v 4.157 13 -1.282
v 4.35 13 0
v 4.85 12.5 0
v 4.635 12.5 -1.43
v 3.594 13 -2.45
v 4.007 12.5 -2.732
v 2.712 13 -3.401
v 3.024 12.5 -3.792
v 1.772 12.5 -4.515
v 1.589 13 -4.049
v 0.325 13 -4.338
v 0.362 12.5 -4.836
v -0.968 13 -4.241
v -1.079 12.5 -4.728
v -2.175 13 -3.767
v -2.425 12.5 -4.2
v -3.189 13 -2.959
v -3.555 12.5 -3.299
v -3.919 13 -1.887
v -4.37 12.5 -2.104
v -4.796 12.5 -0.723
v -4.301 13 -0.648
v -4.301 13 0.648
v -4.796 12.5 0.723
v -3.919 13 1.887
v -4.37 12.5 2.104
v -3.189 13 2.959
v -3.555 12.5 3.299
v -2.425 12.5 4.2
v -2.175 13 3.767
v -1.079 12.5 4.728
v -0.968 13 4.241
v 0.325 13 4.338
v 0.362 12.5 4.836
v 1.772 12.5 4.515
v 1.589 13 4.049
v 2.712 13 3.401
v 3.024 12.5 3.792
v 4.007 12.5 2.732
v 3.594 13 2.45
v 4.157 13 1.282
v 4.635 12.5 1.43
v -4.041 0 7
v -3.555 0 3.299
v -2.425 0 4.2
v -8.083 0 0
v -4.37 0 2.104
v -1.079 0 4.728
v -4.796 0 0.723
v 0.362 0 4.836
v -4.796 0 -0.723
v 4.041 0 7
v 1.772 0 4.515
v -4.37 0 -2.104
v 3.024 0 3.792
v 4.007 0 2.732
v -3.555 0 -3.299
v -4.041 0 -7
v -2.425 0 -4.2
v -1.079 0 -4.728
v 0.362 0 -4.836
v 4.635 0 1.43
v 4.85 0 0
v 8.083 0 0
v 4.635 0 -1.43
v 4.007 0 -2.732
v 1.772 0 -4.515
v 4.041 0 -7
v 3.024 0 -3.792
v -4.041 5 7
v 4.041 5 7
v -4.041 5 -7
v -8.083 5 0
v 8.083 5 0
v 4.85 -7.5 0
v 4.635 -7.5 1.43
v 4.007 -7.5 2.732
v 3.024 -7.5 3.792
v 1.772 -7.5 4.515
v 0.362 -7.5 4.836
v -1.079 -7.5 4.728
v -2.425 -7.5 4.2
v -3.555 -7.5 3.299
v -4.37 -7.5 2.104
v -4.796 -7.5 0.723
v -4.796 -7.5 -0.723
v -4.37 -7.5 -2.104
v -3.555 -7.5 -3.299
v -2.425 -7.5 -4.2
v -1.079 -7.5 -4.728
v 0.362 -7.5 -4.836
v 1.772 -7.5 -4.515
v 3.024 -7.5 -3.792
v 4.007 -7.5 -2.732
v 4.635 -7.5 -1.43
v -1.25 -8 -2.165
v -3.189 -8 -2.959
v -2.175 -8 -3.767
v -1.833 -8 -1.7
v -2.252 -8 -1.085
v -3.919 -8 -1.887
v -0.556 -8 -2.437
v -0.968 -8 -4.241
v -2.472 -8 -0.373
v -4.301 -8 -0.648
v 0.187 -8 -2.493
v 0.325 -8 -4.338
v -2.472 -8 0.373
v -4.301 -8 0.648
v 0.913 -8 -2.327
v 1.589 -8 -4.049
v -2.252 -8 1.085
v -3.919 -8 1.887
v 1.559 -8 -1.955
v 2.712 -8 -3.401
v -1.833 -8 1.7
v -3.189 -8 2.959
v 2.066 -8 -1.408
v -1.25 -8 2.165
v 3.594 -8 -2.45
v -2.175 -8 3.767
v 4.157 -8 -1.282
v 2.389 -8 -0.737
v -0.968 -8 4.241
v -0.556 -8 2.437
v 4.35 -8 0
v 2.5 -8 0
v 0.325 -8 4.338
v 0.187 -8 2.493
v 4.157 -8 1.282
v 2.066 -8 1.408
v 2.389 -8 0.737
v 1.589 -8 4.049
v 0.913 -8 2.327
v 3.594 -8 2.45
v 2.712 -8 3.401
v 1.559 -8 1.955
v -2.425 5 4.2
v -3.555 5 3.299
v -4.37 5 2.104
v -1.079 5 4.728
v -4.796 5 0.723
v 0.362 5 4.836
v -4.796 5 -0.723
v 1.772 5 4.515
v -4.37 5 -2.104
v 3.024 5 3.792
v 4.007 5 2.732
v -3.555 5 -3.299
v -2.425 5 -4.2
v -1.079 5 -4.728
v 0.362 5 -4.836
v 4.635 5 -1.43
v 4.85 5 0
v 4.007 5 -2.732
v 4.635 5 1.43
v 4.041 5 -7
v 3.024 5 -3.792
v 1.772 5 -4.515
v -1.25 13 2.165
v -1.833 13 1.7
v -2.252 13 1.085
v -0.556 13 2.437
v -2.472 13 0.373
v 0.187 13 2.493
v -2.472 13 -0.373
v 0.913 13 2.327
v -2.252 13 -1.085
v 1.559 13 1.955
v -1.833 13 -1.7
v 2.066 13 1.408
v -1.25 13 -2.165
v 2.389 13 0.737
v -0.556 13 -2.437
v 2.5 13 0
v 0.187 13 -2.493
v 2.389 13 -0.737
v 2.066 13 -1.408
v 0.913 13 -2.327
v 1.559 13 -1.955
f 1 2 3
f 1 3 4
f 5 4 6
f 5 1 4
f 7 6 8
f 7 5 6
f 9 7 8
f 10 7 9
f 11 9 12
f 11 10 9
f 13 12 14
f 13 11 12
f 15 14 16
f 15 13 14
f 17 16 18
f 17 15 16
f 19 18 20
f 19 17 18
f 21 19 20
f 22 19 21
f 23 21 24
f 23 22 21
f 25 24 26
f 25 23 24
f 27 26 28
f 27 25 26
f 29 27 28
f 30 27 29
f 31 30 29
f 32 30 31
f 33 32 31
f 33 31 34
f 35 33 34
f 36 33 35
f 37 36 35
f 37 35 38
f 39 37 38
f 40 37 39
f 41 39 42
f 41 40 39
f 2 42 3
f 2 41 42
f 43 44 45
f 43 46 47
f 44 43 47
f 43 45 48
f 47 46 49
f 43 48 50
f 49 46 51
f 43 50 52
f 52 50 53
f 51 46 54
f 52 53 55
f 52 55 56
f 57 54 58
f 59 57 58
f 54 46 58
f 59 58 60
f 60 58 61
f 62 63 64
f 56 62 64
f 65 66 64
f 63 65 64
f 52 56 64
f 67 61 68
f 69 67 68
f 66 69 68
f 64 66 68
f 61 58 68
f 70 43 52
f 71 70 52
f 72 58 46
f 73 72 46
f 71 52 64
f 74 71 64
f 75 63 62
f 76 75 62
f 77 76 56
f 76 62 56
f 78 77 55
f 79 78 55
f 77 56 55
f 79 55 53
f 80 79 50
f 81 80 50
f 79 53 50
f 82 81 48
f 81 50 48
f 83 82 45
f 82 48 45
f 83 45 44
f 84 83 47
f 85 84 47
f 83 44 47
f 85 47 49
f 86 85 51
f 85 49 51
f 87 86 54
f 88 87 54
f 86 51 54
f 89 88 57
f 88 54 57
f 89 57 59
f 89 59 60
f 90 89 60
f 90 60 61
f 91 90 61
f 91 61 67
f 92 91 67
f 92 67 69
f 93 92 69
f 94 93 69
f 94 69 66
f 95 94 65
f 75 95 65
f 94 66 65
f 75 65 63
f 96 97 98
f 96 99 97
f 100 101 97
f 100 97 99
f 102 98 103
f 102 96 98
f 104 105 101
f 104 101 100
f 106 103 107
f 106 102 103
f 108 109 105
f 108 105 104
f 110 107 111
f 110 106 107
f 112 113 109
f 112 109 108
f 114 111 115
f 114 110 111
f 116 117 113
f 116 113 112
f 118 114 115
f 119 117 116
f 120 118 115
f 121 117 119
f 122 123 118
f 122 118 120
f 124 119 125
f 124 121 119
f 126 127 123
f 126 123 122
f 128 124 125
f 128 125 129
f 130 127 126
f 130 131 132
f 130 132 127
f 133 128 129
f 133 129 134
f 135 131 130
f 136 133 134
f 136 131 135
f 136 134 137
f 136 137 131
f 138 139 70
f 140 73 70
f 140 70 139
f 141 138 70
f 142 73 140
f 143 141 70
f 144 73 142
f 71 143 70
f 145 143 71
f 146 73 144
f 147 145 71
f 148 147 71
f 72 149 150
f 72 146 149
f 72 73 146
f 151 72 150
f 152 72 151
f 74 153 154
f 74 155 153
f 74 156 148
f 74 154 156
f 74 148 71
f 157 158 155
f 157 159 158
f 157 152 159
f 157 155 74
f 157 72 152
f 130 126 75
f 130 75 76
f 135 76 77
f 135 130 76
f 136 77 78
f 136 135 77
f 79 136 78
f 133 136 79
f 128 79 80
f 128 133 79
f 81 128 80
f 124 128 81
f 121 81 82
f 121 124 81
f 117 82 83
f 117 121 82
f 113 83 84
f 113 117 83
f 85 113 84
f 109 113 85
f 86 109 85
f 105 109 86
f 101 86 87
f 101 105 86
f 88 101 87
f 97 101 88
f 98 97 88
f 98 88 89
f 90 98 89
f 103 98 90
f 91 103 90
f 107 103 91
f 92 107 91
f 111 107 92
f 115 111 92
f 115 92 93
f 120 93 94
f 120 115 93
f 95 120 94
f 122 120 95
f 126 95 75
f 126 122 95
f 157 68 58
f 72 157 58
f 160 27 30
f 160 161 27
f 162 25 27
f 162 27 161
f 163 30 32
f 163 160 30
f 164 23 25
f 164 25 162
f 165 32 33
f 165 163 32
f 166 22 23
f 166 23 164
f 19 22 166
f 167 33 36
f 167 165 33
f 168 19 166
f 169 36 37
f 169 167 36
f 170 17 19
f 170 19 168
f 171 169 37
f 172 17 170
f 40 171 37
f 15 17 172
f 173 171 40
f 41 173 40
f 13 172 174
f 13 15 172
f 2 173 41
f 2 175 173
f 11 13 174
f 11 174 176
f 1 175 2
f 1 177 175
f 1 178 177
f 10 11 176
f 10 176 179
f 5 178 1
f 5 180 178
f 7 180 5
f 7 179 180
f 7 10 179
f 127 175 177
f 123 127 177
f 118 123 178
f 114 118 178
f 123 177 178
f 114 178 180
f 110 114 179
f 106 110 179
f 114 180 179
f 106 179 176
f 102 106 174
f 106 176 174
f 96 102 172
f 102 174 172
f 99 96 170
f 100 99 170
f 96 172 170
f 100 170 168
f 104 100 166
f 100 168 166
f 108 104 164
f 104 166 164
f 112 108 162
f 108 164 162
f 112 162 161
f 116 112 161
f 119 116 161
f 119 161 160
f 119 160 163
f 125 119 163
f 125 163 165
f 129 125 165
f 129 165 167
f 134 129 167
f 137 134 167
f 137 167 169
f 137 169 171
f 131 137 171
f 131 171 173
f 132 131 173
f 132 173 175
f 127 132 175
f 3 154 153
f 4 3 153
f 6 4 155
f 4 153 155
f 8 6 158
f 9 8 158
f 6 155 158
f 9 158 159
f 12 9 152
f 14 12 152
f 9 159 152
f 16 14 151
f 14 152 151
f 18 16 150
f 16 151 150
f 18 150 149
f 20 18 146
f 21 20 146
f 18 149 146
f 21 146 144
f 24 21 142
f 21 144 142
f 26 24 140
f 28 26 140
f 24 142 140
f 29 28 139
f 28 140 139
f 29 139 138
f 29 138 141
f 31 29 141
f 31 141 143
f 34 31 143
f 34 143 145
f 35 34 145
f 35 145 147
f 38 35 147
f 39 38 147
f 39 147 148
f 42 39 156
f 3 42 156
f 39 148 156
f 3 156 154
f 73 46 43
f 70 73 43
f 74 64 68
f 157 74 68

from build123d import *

# Parameters (mm, degrees)
BOSS_EXTRUDE1_DEPTH = 5
SKETCH2_R           = 4.85
BOSS_EXTRUDE2_DEPTH = 8
SKETCH3_R           = 4.85
BOSS_EXTRUDE3_DEPTH = 8
CHAMFER1_SIZE       = 0.5
SKETCH4_R           = 2.5
CUT_EXTRUDE1_DEPTH  = 22


with BuildPart() as part:
    # Sketch1 → Boss-Extrude1 (new body)
    with BuildSketch(Plane(origin=(0, 0, 0), x_dir=(1, 0, 0), z_dir=(0, 1, 0))):
        Polygon((4.041451884, -7), (8.082903769, 0), (4.041451884, 7), (-4.041451884, 7), (-8.082903769, 0), (-4.041451884, -7), align=None)
    extrude(amount=BOSS_EXTRUDE1_DEPTH)

    # Sketch2 → Boss-Extrude2 (add)
    with BuildSketch(Plane(origin=(0, 5, 0), x_dir=(1, 0, 0), z_dir=(0, 1, 0))):
        Circle(SKETCH2_R)
    extrude(amount=BOSS_EXTRUDE2_DEPTH)

    # Sketch3 → Boss-Extrude3 (add)
    with BuildSketch(Plane.XZ):
        Circle(SKETCH3_R)
    extrude(amount=BOSS_EXTRUDE3_DEPTH)

    # Chamfer1
    chamfer1_edges = [part.edges().sort_by_distance(p)[0] for p in [
        (-4.85, 13, 0),
        (-4.85, -8, 0),
    ]]
    chamfer(chamfer1_edges, length=CHAMFER1_SIZE)

    # Sketch4 → Cut-Extrude1 (cut, through all)
    with BuildSketch(Plane(origin=(0, 13, 0), x_dir=(1, 0, 0), z_dir=(0, 1, 0))):
        Circle(SKETCH4_R)
    extrude(amount=-CUT_EXTRUDE1_DEPTH, mode=Mode.SUBTRACT)


solid = part.part
